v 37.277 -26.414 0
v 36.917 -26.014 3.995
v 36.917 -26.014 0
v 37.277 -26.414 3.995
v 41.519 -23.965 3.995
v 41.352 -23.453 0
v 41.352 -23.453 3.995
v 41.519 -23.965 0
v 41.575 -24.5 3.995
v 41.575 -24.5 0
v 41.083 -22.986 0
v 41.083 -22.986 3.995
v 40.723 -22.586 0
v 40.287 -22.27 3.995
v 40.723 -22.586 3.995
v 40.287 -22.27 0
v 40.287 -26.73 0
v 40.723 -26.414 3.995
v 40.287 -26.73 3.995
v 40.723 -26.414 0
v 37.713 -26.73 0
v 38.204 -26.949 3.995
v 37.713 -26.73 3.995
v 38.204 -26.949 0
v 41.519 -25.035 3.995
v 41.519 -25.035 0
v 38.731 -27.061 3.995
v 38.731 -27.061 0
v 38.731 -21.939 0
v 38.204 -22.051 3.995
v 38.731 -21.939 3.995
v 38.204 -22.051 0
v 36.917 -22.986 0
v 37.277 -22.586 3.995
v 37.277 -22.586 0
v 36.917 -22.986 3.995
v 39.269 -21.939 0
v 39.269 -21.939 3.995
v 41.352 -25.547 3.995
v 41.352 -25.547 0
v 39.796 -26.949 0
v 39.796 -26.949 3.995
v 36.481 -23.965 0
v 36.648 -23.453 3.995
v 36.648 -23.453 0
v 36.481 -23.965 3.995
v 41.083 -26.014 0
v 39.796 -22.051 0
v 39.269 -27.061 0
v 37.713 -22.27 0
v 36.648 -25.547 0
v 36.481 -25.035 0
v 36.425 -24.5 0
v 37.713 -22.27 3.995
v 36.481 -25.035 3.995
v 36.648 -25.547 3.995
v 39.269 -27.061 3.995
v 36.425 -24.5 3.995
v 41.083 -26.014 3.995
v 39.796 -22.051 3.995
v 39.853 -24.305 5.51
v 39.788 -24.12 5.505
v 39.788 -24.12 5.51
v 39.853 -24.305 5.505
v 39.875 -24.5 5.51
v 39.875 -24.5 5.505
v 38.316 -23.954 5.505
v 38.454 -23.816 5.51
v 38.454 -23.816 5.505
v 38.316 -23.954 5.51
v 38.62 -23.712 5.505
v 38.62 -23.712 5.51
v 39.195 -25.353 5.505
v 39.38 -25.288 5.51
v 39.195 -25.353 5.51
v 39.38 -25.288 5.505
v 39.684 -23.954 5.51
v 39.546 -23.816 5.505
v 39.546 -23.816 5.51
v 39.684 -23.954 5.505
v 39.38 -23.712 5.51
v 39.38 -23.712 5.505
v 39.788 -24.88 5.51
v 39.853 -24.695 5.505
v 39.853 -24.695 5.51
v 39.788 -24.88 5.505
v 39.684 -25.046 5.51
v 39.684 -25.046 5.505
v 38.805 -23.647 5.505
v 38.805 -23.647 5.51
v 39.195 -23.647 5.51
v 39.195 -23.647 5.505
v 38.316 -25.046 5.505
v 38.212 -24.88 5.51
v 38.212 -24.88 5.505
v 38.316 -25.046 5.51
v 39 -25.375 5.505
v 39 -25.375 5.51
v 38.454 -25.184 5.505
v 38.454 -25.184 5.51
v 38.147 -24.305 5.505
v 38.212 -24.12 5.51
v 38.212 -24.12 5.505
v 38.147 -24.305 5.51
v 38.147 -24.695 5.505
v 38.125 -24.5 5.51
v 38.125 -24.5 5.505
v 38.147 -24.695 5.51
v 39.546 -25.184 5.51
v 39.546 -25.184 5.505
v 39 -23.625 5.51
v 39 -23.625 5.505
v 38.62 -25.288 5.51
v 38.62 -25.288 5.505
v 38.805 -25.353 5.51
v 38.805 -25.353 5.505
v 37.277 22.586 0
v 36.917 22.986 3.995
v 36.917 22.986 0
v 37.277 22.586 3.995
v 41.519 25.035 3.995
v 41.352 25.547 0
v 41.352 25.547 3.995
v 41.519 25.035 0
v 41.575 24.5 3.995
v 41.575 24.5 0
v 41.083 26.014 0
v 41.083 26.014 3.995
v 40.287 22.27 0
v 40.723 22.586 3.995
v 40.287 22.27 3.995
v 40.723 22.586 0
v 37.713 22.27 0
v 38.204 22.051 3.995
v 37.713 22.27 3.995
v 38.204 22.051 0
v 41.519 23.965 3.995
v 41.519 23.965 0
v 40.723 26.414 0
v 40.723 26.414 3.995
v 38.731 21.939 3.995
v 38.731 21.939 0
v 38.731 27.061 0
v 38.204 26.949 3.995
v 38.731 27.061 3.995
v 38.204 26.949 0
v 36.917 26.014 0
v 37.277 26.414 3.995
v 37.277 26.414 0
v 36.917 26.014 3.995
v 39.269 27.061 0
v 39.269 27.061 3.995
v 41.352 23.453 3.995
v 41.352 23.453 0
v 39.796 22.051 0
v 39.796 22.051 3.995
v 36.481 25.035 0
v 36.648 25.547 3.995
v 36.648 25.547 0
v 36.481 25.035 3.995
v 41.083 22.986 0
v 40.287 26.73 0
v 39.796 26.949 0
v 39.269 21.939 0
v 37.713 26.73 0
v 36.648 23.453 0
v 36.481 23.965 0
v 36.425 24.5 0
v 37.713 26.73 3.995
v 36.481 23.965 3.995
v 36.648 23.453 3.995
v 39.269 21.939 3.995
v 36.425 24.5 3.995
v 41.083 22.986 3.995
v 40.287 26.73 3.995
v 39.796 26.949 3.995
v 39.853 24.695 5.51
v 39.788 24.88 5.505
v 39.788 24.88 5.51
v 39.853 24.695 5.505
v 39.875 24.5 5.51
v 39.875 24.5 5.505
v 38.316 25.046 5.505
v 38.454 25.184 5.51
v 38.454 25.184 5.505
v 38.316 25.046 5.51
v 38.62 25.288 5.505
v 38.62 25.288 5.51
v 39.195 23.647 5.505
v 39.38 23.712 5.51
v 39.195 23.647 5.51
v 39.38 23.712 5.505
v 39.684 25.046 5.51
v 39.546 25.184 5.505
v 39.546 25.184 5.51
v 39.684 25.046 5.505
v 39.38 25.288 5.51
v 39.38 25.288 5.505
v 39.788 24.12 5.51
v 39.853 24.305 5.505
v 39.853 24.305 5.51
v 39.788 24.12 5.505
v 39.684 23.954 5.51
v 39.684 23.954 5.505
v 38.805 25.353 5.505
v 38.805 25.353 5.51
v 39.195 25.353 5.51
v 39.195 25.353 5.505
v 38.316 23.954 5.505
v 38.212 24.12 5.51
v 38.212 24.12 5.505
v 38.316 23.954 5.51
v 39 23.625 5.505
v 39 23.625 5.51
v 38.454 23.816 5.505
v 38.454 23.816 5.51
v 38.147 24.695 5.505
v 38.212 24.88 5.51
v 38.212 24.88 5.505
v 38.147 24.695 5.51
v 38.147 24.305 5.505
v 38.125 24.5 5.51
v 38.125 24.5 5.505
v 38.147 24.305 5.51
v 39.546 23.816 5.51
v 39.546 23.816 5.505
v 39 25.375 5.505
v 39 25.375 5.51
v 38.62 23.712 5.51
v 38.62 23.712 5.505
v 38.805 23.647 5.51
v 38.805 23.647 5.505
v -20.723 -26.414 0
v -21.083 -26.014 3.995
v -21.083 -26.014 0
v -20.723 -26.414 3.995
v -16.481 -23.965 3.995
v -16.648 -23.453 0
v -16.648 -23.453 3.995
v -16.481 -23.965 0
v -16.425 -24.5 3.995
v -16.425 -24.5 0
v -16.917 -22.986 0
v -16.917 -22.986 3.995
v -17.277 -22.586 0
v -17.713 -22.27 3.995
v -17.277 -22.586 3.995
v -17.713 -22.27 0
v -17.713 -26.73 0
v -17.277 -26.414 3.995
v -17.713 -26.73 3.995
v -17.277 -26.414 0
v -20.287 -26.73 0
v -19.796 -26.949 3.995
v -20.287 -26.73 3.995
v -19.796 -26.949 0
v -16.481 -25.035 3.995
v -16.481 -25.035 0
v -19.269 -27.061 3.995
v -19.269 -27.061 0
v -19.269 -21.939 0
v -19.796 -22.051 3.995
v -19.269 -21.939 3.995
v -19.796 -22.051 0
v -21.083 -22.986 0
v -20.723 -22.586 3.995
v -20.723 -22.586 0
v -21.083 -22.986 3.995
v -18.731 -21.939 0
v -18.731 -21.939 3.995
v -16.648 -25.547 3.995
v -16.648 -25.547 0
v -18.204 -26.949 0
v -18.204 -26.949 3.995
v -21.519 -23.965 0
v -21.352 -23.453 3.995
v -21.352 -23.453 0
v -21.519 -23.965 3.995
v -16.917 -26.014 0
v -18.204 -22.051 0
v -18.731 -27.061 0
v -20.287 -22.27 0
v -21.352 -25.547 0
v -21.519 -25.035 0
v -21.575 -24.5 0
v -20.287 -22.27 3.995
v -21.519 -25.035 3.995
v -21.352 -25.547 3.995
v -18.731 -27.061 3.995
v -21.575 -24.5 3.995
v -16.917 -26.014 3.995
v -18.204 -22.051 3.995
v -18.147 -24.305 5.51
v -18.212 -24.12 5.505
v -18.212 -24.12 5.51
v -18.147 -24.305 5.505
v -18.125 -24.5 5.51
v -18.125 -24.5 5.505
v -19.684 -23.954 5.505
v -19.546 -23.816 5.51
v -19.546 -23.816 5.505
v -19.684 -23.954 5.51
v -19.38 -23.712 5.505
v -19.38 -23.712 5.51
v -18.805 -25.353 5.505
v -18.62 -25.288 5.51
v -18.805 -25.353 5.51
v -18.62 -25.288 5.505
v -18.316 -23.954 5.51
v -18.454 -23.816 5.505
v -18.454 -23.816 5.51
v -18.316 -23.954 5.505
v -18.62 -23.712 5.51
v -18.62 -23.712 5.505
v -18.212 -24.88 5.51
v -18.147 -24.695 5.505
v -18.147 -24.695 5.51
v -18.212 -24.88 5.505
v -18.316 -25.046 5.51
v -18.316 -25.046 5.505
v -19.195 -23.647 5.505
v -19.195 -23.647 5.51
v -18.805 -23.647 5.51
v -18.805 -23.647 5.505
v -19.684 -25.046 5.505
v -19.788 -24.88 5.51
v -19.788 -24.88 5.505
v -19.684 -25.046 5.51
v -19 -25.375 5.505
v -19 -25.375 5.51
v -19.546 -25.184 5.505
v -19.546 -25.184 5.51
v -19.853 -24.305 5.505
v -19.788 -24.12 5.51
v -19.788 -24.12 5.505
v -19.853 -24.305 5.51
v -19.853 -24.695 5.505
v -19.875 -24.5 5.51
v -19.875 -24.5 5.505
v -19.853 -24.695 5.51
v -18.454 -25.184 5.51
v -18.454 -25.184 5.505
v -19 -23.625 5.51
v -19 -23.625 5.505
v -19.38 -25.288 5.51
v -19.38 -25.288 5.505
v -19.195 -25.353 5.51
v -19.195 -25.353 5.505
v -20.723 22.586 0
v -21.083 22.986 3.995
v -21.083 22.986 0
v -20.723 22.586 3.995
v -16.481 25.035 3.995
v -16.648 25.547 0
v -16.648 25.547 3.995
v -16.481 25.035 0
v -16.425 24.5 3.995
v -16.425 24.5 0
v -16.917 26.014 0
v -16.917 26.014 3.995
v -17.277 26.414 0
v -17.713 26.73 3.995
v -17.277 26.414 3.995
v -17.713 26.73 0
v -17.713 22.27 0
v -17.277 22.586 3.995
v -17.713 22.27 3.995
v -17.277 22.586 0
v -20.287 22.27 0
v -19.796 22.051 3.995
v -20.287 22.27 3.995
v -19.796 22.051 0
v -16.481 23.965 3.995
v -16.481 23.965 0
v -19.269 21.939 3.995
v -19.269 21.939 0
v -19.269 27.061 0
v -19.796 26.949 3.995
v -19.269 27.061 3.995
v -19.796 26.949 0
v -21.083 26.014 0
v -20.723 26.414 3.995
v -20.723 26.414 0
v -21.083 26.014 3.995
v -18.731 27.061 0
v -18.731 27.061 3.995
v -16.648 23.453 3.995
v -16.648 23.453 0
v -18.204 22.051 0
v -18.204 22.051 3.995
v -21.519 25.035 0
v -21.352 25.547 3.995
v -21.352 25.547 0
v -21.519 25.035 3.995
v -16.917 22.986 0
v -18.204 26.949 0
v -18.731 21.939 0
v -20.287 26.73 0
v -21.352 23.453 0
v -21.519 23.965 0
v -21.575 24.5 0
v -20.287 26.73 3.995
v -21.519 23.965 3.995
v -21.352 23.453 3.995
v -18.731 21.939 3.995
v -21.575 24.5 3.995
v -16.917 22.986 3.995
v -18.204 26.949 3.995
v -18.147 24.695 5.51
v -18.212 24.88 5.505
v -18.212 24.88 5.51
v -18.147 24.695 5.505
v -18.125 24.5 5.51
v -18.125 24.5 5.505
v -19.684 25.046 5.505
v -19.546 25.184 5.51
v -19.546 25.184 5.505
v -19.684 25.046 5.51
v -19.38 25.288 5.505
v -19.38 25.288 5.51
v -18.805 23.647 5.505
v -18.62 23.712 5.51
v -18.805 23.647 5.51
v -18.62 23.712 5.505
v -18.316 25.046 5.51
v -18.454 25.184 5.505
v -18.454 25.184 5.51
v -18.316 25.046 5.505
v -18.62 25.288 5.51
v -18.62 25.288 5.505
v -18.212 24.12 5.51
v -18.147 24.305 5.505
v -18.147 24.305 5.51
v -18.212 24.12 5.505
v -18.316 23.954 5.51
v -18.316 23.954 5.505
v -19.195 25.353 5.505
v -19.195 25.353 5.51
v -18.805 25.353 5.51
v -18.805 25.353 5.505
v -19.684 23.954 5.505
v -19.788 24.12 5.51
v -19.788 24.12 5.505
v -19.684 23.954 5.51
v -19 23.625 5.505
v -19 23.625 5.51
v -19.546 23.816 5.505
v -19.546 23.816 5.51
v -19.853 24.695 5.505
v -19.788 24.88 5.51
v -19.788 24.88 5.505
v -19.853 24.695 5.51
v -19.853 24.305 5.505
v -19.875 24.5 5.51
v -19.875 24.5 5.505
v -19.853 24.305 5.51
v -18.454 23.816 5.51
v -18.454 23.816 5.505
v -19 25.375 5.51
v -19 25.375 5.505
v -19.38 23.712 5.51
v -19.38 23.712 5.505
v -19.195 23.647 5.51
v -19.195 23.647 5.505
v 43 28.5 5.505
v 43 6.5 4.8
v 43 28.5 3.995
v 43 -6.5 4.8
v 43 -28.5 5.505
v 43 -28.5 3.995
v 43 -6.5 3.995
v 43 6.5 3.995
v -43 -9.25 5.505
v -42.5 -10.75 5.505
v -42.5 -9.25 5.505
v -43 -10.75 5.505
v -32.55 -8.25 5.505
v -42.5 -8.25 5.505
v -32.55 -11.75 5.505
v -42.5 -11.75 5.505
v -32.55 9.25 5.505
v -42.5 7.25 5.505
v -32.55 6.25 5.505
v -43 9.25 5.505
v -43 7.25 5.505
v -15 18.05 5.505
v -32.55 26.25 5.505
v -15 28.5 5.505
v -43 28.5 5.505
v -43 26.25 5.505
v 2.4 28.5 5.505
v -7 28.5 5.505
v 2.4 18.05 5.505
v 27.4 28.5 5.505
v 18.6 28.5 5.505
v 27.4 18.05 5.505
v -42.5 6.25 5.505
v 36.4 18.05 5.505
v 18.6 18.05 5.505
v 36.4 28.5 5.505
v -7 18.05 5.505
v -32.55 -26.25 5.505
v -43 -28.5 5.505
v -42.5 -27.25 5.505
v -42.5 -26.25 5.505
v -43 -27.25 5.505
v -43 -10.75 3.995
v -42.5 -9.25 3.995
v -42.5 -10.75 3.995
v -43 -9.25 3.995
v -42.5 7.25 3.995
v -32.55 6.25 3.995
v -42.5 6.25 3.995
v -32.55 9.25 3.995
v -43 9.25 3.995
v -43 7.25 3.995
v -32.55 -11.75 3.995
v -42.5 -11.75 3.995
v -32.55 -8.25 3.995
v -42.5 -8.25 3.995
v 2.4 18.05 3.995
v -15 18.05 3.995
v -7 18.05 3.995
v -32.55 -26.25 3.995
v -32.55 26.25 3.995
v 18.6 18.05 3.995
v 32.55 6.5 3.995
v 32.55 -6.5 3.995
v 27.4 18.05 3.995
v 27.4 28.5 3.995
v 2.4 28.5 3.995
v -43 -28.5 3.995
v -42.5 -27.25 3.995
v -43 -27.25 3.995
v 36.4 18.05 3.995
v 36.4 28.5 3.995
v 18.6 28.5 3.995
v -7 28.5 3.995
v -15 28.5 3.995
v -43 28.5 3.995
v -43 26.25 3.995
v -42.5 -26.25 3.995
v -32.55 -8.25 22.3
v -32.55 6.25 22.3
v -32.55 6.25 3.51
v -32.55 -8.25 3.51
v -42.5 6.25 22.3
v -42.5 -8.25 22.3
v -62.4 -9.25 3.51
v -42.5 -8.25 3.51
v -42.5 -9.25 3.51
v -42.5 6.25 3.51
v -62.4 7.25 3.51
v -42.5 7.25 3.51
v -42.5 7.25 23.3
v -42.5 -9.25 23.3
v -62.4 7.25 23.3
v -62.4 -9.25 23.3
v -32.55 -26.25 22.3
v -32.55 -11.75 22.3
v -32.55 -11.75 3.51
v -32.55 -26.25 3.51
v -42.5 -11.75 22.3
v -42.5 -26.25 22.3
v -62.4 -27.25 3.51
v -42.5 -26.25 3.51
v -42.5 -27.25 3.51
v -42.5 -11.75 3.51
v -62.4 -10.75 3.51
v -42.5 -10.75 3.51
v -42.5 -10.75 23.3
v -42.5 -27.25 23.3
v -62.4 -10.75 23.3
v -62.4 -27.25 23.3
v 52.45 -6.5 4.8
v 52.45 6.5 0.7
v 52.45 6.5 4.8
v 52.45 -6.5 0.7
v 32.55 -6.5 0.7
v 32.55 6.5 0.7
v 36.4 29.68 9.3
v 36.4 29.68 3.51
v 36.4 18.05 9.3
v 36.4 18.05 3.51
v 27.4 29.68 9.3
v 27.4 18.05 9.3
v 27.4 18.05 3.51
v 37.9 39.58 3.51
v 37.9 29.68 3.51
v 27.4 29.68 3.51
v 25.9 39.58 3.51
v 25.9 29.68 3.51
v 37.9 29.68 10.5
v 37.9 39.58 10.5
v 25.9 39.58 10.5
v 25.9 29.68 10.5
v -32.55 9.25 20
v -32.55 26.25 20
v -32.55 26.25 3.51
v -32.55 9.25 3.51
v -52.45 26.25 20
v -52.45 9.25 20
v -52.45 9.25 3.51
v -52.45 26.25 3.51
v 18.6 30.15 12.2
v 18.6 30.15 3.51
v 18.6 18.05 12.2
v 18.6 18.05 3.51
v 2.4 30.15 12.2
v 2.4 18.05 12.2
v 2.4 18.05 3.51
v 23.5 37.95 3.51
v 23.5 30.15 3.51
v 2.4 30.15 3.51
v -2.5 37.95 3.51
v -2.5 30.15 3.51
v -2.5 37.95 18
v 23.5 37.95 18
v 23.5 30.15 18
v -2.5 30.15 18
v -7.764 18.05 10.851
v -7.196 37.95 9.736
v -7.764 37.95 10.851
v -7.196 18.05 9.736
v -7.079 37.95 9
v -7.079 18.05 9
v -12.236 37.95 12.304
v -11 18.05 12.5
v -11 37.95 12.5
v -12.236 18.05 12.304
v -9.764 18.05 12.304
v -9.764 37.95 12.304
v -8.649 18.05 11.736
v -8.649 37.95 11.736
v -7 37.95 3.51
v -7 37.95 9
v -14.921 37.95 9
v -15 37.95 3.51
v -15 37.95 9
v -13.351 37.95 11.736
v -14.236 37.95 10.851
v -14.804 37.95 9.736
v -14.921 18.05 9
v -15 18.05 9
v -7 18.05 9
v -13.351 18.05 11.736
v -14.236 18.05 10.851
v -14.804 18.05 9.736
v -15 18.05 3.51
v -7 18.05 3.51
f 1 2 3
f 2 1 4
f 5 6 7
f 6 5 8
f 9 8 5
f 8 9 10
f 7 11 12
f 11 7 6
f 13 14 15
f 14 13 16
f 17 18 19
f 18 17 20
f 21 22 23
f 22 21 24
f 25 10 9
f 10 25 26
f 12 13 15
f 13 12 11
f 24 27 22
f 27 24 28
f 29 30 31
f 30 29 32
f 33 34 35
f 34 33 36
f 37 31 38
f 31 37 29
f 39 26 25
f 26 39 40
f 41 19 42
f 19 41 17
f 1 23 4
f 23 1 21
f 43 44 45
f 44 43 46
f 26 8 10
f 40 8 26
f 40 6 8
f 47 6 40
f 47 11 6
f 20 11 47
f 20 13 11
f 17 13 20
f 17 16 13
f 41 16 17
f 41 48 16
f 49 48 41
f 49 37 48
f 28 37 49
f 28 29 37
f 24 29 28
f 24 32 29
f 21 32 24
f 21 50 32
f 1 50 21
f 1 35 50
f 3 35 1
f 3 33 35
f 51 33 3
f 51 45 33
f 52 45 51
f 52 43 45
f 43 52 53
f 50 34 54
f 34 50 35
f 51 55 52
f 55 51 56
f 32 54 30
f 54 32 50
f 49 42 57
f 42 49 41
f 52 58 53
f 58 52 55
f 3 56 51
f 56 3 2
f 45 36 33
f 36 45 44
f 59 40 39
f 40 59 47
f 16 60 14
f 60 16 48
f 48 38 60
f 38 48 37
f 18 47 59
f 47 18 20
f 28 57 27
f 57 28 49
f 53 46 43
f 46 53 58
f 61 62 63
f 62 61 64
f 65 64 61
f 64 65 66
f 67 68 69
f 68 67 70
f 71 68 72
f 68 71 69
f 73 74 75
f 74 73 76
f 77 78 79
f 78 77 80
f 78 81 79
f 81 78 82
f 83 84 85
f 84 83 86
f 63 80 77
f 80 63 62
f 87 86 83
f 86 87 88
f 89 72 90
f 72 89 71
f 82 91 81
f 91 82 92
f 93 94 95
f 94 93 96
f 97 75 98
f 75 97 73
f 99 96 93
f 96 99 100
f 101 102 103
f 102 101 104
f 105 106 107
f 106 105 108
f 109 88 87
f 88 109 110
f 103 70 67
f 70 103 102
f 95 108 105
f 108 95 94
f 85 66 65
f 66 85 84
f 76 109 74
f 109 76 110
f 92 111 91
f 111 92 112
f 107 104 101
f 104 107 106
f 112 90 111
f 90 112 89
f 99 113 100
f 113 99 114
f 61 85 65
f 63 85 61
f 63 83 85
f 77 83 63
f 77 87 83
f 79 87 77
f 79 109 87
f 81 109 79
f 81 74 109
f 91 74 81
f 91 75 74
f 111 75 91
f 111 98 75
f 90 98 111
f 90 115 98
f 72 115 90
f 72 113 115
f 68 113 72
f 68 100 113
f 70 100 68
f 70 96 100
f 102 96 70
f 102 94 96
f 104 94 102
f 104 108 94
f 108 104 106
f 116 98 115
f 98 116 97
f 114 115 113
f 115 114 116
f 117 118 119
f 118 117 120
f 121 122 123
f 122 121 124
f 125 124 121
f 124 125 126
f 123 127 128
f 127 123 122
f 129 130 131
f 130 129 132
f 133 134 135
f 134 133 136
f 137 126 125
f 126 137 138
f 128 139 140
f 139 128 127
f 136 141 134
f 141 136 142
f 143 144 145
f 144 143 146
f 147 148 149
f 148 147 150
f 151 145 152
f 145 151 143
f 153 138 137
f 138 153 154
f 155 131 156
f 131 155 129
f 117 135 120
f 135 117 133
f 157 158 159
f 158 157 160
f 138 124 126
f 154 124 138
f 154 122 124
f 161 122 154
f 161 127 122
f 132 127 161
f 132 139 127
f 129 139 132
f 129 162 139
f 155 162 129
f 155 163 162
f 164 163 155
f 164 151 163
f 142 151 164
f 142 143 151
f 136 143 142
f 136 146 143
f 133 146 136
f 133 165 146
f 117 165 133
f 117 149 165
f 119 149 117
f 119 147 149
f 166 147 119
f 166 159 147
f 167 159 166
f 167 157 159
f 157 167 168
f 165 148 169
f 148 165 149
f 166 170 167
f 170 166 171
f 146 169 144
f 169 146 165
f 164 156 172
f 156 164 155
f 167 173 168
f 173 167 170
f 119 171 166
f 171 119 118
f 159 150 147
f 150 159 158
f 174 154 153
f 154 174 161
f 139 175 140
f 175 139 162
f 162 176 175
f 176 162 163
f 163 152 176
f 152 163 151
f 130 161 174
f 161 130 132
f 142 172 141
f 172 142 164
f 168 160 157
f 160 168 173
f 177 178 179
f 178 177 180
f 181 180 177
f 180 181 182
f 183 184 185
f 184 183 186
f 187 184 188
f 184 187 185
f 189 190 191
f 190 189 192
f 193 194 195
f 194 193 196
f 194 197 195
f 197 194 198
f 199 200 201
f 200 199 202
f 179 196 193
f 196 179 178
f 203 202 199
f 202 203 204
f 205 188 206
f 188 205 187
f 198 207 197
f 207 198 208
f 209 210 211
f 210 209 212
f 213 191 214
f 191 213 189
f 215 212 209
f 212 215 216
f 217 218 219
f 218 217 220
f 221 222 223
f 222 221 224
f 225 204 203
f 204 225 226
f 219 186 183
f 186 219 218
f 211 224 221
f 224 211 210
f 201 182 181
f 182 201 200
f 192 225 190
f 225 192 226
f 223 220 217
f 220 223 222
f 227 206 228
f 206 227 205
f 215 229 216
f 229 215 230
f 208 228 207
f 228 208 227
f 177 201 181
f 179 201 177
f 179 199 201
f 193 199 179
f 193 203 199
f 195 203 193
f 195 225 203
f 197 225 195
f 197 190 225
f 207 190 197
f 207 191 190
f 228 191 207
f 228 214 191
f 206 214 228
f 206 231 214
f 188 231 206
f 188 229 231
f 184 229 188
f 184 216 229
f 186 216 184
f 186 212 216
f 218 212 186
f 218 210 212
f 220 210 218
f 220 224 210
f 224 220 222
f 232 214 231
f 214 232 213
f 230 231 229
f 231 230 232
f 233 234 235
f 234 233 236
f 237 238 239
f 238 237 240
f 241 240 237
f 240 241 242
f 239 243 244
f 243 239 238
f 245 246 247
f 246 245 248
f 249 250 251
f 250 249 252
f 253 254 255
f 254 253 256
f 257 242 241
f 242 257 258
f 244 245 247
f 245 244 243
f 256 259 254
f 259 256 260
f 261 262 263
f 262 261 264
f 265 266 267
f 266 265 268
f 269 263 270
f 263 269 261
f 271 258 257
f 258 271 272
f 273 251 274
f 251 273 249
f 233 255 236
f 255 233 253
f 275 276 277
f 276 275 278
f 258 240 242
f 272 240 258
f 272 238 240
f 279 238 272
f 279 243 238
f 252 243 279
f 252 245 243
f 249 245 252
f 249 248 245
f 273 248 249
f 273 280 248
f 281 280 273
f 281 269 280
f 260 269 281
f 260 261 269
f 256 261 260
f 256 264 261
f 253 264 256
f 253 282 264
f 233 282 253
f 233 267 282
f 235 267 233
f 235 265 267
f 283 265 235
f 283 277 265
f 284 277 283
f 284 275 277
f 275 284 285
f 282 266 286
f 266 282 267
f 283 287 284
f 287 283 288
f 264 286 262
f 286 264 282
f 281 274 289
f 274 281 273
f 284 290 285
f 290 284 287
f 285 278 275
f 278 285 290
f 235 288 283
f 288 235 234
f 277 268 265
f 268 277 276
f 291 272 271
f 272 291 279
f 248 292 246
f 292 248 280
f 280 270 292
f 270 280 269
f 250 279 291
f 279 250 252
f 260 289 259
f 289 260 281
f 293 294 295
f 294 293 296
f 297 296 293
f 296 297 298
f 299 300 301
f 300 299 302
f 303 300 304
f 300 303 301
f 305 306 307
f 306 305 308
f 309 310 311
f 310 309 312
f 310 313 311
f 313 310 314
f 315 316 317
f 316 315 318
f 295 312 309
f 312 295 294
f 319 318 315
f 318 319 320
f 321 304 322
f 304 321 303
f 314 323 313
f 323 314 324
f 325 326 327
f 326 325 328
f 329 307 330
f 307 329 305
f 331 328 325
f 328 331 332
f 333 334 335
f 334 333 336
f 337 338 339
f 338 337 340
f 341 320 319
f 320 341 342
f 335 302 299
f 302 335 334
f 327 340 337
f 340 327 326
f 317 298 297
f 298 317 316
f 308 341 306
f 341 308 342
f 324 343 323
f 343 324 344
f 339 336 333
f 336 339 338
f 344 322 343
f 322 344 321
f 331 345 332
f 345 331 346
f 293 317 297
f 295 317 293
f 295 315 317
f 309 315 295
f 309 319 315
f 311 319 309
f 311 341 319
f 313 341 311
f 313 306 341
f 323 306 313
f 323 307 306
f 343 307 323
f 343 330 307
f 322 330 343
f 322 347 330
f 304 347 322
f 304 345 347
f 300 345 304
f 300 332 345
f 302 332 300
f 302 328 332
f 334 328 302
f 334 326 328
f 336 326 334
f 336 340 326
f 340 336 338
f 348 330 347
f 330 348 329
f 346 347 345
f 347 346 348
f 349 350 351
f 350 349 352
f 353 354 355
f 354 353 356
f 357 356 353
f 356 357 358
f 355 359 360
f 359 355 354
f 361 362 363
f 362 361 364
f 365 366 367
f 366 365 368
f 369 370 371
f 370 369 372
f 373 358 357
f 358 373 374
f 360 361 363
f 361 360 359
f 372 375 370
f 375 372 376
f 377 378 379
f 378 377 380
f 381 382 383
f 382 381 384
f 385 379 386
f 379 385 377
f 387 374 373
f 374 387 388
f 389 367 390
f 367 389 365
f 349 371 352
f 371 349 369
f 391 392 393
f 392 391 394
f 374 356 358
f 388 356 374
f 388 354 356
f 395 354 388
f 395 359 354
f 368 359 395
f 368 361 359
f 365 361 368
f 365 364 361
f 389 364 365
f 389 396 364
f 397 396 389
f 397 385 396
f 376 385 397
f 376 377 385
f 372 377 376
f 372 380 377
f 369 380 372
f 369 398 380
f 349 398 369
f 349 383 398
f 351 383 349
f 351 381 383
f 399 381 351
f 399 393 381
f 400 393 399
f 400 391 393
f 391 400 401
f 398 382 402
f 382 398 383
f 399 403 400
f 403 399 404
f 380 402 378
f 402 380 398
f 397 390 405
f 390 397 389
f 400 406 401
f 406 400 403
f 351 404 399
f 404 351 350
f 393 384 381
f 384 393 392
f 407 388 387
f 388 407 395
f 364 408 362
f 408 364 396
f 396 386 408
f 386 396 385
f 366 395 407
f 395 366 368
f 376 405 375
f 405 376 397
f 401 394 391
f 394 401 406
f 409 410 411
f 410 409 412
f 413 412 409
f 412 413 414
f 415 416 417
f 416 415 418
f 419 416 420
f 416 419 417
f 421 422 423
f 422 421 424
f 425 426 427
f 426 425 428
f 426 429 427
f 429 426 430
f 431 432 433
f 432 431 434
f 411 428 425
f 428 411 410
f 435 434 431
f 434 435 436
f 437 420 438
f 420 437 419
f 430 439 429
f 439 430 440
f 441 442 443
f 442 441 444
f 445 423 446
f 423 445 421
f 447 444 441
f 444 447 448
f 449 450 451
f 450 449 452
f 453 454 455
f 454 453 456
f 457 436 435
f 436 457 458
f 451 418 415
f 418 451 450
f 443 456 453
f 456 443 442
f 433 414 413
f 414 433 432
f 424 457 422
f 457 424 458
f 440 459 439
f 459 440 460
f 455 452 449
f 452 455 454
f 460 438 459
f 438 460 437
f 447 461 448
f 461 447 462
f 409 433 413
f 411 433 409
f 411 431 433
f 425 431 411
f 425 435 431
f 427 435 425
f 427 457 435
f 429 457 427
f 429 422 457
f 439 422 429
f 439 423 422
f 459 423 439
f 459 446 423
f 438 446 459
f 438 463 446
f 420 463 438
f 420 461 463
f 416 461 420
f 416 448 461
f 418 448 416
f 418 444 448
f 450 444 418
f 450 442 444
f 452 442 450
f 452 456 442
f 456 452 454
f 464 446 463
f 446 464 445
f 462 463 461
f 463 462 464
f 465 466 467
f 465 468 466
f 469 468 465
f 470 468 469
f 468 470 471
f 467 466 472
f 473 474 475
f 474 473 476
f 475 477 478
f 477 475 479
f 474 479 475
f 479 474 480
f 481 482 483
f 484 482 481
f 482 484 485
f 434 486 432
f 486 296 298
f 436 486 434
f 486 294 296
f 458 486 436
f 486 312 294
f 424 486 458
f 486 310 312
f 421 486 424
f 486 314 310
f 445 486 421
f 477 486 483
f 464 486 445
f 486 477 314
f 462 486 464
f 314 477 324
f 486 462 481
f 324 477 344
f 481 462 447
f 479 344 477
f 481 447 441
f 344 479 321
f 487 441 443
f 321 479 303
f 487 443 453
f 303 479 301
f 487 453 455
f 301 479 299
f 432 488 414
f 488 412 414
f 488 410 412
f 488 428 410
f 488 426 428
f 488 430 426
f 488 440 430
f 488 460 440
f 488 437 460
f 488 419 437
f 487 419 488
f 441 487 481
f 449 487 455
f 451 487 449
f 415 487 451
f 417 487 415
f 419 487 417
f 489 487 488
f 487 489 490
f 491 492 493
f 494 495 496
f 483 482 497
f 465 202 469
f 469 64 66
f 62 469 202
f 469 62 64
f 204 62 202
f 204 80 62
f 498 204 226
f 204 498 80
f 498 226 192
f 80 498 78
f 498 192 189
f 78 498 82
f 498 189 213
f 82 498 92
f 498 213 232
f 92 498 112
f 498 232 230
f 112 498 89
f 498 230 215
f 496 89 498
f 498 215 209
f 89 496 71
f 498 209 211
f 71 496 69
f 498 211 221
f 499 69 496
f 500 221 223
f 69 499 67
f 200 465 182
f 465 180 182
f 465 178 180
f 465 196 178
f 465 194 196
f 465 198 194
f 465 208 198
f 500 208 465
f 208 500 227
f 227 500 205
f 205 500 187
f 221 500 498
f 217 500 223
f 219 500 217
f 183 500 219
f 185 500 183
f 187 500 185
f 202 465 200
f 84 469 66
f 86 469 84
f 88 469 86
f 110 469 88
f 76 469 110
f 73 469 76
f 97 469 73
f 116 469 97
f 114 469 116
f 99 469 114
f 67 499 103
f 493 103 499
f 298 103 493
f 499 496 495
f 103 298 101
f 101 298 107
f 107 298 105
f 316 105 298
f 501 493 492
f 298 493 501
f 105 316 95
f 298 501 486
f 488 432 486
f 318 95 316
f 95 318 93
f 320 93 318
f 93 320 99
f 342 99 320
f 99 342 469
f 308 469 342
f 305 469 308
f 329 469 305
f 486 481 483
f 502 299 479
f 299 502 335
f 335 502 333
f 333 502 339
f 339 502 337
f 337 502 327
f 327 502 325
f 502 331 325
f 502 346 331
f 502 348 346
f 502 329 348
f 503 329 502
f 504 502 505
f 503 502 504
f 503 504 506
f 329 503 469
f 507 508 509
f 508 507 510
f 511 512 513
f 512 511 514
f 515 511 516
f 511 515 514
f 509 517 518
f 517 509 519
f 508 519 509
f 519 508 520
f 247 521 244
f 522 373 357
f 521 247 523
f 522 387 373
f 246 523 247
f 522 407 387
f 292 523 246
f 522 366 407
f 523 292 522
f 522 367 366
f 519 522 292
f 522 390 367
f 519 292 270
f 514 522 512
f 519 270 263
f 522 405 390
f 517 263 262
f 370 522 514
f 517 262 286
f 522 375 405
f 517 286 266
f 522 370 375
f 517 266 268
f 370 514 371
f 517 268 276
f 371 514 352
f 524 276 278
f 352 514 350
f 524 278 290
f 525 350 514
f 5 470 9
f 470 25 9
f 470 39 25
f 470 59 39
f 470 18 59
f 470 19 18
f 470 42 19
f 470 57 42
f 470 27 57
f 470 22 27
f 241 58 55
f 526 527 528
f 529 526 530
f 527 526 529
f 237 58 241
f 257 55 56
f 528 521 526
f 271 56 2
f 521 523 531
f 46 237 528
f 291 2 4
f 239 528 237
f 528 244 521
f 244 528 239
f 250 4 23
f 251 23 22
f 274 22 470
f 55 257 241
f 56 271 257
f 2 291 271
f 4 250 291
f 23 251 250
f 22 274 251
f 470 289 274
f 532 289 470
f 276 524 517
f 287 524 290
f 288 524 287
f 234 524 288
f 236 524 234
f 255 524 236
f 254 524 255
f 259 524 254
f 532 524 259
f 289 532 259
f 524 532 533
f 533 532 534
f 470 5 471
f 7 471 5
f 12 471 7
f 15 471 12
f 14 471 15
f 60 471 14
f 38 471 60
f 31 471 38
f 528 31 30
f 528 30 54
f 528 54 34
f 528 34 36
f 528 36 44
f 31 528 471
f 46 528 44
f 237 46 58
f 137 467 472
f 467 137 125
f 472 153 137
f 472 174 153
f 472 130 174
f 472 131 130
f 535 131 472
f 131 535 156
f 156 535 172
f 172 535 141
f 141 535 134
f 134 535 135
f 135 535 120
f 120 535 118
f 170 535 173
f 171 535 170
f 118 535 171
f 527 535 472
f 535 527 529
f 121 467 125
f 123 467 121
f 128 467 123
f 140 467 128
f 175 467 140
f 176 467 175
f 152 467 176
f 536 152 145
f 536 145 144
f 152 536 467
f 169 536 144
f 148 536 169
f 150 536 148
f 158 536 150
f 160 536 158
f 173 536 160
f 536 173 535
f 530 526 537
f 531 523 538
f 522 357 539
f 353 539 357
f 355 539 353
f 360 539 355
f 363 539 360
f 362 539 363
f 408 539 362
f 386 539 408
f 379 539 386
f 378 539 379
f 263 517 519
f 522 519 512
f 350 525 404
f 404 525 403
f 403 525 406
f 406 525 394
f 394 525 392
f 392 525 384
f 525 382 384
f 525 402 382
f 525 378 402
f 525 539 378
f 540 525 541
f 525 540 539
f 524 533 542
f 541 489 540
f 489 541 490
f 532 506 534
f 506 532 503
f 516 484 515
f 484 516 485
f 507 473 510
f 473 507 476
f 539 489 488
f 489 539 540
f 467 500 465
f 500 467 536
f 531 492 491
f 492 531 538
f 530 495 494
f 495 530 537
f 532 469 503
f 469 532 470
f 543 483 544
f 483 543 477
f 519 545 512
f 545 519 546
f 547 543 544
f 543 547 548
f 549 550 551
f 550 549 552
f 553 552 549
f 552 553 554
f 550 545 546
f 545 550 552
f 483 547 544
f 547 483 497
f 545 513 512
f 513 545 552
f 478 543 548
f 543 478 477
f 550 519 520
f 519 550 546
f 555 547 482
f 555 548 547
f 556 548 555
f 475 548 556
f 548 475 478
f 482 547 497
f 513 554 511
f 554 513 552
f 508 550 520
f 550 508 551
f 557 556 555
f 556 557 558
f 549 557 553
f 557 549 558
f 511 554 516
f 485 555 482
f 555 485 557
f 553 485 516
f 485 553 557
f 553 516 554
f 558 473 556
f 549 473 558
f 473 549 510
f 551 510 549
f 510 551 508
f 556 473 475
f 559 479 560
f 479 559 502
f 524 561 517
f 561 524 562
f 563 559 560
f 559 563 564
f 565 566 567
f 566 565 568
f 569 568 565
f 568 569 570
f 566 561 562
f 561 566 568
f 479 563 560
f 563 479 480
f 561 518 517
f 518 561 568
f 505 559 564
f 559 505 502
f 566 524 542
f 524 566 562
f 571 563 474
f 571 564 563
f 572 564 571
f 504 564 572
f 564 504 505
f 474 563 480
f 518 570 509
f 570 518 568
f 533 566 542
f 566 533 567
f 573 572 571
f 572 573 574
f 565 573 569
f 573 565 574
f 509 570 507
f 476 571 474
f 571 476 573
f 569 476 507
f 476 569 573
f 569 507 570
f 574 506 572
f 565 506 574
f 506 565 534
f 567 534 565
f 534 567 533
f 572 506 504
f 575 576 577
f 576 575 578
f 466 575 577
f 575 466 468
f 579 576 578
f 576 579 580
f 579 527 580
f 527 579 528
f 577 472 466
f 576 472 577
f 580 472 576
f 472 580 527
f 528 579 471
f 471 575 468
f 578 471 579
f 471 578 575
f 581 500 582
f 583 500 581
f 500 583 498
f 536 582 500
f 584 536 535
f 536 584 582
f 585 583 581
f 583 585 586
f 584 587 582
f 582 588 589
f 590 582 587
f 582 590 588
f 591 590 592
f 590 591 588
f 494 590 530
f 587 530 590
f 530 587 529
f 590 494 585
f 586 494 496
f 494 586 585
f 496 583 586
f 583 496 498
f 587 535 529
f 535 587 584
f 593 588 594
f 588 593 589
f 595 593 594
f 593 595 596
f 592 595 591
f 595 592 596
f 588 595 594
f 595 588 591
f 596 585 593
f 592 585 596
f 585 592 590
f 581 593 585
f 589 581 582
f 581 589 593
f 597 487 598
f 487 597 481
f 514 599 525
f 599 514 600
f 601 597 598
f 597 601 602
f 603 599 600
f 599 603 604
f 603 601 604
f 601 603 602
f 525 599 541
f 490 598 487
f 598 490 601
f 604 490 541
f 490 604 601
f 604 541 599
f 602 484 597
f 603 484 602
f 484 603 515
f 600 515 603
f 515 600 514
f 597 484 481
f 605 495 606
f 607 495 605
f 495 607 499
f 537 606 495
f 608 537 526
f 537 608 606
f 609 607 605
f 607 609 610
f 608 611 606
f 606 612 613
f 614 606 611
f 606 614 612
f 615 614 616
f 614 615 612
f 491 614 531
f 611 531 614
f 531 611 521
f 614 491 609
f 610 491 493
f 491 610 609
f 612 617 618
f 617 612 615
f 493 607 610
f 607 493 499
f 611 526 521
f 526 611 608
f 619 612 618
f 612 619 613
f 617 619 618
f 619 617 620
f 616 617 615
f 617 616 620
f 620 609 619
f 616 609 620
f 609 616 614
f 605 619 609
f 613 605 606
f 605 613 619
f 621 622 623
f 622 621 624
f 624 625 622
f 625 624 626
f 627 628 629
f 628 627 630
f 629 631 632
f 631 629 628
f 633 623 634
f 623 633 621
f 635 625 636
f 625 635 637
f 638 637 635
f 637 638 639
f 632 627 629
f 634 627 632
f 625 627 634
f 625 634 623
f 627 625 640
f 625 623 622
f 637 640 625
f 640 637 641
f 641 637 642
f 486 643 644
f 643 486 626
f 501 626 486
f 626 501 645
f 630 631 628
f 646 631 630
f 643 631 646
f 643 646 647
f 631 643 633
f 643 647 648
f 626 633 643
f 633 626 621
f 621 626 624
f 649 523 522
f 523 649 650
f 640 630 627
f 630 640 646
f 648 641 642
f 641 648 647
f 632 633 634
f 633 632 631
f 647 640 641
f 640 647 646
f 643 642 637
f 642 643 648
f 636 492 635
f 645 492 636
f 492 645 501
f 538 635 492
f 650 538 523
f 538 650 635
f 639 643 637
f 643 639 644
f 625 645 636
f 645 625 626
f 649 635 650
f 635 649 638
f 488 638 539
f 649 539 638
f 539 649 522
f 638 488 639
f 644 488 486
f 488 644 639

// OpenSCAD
//
// raspberry pi model B+
//
// design by Egil Kvaleberg, 8 Aug 2015
// Rasoberrypi 3 adapt by Guy Sheffer 28 Apr 2016
//
// drawing of the B+ model, for referrence:
// https://www.raspberrypi.org/documentation/hardware/raspberrypi/mechanical/Raspberry-Pi-B-Plus-V1.2-Mechanical-Drawing.pdf
//
// notes:
// design origin is middle of PCB
//

/* [Hidden] */
mil2mm = 0.0254;
pcb = [85.0, 56.0, 1.5]; // main board
pcb2floor = 4.0; // 3.5
pcb2roof = 17.0; // 15.7

pcbmntdia = 2.75; // mounting holes
pcbmnt1dx = pcb[0]/2 - 3.5;  // 
pcbmnt1dy = 3.5 - pcb[1]/2;
pcbmnt2dx = pcb[0]/2 - 3.5 - 58.0; // 
pcbmnt2dy = pcb[1]/2 - 3.5;
pcbmnthead = 6.2; // countersunk
pcbmntthreads = 2.2;

cardsy = 12.0; // card measures 11.0
cardsz = 3.1;
cardsx = 8.0; // size of internal platform
carddy = pcb[1]/2 - 28.0;
ethersy = 16.0; // ethernet contact width
ethersz = 13.5 + 0.5;
etherdy = pcb[1]/2 - 10.25;
usbsy = 13.5; // core
usbframe = 1.0; // frame
usbsz = 15.8 + 0.5;
usb1dy = pcb[1]/2 - 29.0;
usb2dy = pcb[1]/2 - 47.0;
powerpsx = 11.0; // power plug width 
powerpsz = 4.5; // plug height
powerssx = 8.0; // power socket width 
powerssz = 3.3; // socket height
powerdz = -1.7; // for plug 
powerdx = pcb[0]/2 - 10.6; // 
hdmisx = 15.2; // hdmi contact width
hdmisz = 6.2;
hdmipsx = 25.0; // typical plug
hdmipsz = 12.0;
hdmidx = pcb[0]/2 - 32.0;
audior = 7.0; // audio contact radius
audiodz = 6.0/2; // above pcb
audiodx = pcb[0]/2 -53.5;
d = 0.01;

frame_w = pcb[2] -d; // width of lip for frame 

tol = 0.5; // general tolerance
wall = 1.2; // general wall thickness
breakaway = 0.3; // have hidden hole for screw, 0 for no extra pegs 

raspberryMount(true);
raspberryPlugs();
            

module raspberryMount(show = false){
    for (dx = [pcbmnt1dx,pcbmnt2dx]) for (dy = [pcbmnt1dy,pcbmnt2dy]) 
    pedestal(dx, dy , pcb2floor, pcbmntdia );
    if(show)
        translate([0,0,pcb2floor + pcb[2]*0.5])cube([2*tol+pcb[0], 2*tol+pcb[1], pcb[2]+d],true);
}

module raspberryPlugs(){
    translate([0,0,pcb2floor+pcb[2] ]) plugs(tol);
}
        
module c_cube(x, y, z) {
	translate([-x/2, -y/2, 0]) cube([x, y, z]);
}

module pedestal(dx, dy, hg, dia) {
    translate([dx, dy, 0]) {
				cylinder(r = dia/2+wall, h = hg, $fs=0.2);
                // pegs through pcb mount holes
                if (breakaway > 0) translate([0, 0, hg]) 
                        cylinder(r = dia/2 - tol, h = pcb[2]+d, $fs=0.2);
            }
        }
        

module plugs(extra) { 
        module usb_plug(dy) {
            translate([-pcb[0]/2, dy, -extra-frame_w]) 
				c_cube(19.9, usbsy+2*extra, usbsz+2*extra+frame_w);
            translate([-pcb[0]/2 -19.9/2, dy, -extra-frame_w]) 
				c_cube(19.9, usbsy+2*usbframe+2*extra, usbsz+2*extra+frame_w+2*usbframe/2);
        }
        // card slot
        translate([pcb[0]/2, carddy, -cardsz-extra - 1.2]) // fudge 
			c_cube(19.9, cardsy+2*extra, cardsz+2*extra);
        // power socket (near side)
        translate([powerdx, pcb[1]/2, -extra-frame_w]) 
			c_cube(powerssx+2*extra, 19.9, powerssz+2*extra+frame_w);
        // room for power plug
        translate([powerdx, pcb[1]/2+9.9/2+wall*1.4, -extra-frame_w]) 
			c_cube(powerpsx+2*extra, 9.9, powerpsz+2*extra+frame_w);
       // ether plug 
        translate([-pcb[0]/2, etherdy, -extra-frame_w]) 
			c_cube(19.9, ethersy+2*extra, ethersz+2*extra+frame_w); // use half tol horizontally, seems to be enough
       // usb plugs
       usb_plug(usb1dy);
       usb_plug(usb2dy);
        // hdmi socket (near side)
        translate([hdmidx, pcb[1]/2, -extra-frame_w]) 
			c_cube(hdmisx+2*extra, 19.9, hdmisz+2*extra+frame_w);
        translate([hdmidx, pcb[1]/2+19.9/2-7.8/2, -extra-frame_w]) 
			c_cube(hdmipsx+2*extra, 7.8, hdmipsz+2*extra+frame_w);
        // audio plug (near side)
        translate([audiodx, pcb[1]/2 + 19.9/2, audiodz]) 
			rotate([90, 0, 0]) cylinder(r=audior/2+extra, h=19.9, $fn=20);
        translate([audiodx, pcb[1]/2, -extra-frame_w]) 
			c_cube(audior+2*extra, 19.9, audiodz+2*extra+frame_w);

    }
